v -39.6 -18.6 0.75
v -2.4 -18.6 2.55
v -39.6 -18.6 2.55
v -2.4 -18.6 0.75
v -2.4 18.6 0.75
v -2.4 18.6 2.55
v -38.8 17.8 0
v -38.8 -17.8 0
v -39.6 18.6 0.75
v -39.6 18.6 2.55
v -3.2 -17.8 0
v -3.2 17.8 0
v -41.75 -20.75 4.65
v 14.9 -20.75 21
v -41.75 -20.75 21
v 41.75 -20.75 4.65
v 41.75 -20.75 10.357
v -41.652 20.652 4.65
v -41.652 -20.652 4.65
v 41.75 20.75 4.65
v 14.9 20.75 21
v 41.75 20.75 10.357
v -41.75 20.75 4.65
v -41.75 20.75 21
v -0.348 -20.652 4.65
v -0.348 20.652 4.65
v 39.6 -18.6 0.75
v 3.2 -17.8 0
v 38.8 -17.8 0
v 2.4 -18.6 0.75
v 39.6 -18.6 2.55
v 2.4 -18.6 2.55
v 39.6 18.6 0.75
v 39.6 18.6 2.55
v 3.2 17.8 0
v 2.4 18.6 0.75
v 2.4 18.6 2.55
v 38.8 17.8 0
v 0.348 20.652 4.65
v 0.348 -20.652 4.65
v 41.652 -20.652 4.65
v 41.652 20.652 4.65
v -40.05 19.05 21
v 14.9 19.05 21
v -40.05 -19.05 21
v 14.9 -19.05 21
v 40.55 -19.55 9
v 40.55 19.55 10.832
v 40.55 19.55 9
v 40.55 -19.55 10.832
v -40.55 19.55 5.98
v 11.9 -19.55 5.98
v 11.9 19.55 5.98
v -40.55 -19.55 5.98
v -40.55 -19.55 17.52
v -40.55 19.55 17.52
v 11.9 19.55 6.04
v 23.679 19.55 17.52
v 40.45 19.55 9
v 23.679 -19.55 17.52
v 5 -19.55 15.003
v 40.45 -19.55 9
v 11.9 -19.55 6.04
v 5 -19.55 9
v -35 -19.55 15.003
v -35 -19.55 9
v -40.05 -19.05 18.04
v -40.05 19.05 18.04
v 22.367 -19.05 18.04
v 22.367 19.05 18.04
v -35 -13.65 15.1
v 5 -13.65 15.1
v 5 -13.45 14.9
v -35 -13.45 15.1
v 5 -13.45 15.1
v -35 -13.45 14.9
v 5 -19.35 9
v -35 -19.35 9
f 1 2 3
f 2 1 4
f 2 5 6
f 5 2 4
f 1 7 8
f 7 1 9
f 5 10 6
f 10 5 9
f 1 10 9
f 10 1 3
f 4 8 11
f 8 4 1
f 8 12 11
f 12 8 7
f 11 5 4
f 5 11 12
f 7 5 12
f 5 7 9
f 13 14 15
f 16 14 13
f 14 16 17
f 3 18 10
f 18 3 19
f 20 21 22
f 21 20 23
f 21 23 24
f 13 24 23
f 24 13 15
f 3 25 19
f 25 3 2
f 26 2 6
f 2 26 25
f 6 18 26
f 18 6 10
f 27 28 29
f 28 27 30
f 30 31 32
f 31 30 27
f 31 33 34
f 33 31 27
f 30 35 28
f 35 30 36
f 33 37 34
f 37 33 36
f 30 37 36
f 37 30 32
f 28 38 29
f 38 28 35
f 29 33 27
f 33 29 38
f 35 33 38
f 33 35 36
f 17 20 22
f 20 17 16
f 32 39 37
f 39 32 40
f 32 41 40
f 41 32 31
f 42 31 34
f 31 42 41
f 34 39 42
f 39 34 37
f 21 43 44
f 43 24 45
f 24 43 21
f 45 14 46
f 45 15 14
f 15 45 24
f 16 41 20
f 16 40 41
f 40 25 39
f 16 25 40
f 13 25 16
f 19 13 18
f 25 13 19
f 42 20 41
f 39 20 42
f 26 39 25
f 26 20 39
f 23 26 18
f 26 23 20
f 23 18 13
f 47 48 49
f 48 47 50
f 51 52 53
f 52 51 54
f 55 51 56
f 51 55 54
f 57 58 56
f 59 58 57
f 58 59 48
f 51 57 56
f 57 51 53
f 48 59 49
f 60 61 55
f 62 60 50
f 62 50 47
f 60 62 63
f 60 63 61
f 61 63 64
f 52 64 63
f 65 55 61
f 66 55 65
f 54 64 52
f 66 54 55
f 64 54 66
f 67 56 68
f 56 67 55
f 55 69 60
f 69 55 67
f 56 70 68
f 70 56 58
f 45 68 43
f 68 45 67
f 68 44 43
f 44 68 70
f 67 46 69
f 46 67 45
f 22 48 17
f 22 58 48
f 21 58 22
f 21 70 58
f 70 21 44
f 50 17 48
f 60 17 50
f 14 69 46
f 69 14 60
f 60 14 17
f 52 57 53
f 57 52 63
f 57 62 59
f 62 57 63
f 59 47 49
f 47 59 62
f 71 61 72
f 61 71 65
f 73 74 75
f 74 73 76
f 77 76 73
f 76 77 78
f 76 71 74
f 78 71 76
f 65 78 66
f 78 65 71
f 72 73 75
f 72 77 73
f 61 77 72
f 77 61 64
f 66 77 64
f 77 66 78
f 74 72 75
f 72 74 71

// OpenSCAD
// Gridfinity bin 2x1 x 3U tall
// Outside 83.5 x 41.5, H=21, foot 0.8/1.8/2.15, stacking lip, label shelf, scoop
grid = 42;
clr = 0.5;
Lx = 2*grid - clr; // 83.5
Ly = 1*grid - clr; // 41.5
H = 3*7; // 21
h1 = 0.8;
h2 = 1.8;
h3 = 2.15;
Hfoot = h1+h2+h3; // 4.75
foot_bot = Ly - 2*(h1+h3); // 35.6
foot_mid = foot_bot + 2*h1; // 37.2
wt = 1.2;
lipExtra = 0.5;
floorTop = 6.0;
lipTrans0 = 17.5;
lipTop0 = 18.0;
frontTop = 10;
x0 = 15;
xr0 = 12;
rampTop = 9;
shelfLen = 40;
shelfCx = -15; // shelf x in [-35,5]
shelf_y_wall = -(Ly/2 - wt); // -19.55
shelf_y_tip = shelf_y_wall + 6; // -13.55
shelf_z_bot = 9;
shelf_z_top = 15;
x1f = -grid/2;
x2f = grid/2;

echo(cadverify_spec = [
    ["bounds", [[-Lx/2, -Ly/2, 0], [Lx/2, Ly/2, H]]],
    ["bodies", 1],
    ["through_holes", 0],
    ["support_faces", [["bed", "-z", 2000]]],
    ["overhangs_allowed", [
        ["foot chamfer, 45deg self-supporting", [[-39.8, -18.8, -0.1], [-2.2, 18.8, 0.9]]],
        ["foot chamfer, 45deg self-supporting", [[2.2, -18.8, -0.1], [39.8, 18.8, 0.9]]],
        ["bridge between feet, 0.5mm span", [[-41.75, -20.75, 4.5], [41.75, 20.75, 4.8]]],
        ["label shelf underside", [[-35.2, -19.8, 8.8], [5.2, -19.1, 9.2]]]
    ]],
    ["copies", 1],
    ["details", [
        ["foot_left", "material", [[x1f-foot_bot/2, -foot_bot/2, 0.05], [x1f+foot_bot/2, foot_bot/2, 0.55]], 0.9],
        ["foot_right", "material", [[x2f-foot_bot/2, -foot_bot/2, 0.05], [x2f+foot_bot/2, foot_bot/2, 0.55]], 0.9],
        ["lip_back", "material", [[-30, Ly/2-wt-lipExtra, 19], [0, Ly/2, 21]], 0.9],
        ["label_shelf", "material", [[-30, -19, 14.5], [0, -14.5, 15]], 0.9],
        ["scoop_void", "void", [[30, -15, 10.5], [40.4, 15, 14]], 0.9],
        ["cavity", "void", [[-20, -10, 10], [10, 10, 16]], 0.9],
        ["wall", "thickness", [0, 25, 15], [0, -1, 0], 1.2],
        ["floor", "thickness", [-21, 0, -5], [0, 0, 1], 6.0]
    ]]
]);

module foot(cx) {
    hull() {
        translate([cx-foot_bot/2, -foot_bot/2, 0]) cube([foot_bot, foot_bot, 0.1]);
        translate([cx-foot_mid/2, -foot_mid/2, h1-0.05]) cube([foot_mid, foot_mid, 0.1]);
    }
    translate([cx-foot_mid/2, -foot_mid/2, h1-0.05]) cube([foot_mid, foot_mid, h2+0.1]);
    hull() {
        translate([cx-foot_mid/2, -foot_mid/2, h1+h2-0.05]) cube([foot_mid, foot_mid, 0.1]);
        translate([cx-Ly/2, -Ly/2, Hfoot]) cube([Ly, Ly, 0.1]);
    }
}

module body_outer() {
    foot(x1f);
    foot(x2f);
    translate([-Lx/2, -Ly/2, Hfoot-0.1]) cube([Lx, Ly, H-Hfoot+0.1]);
}

module cavity_solid() {
    intL_low = Lx-2*wt;
    intW_low = Ly-2*wt;
    intL_up = Lx-2*(wt+lipExtra);
    intW_up = Ly-2*(wt+lipExtra);
    translate([-intL_low/2, -intW_low/2, floorTop-0.02]) cube([intL_low, intW_low, (lipTrans0-floorTop)+0.02]);
    hull() {
        translate([-intL_low/2, -intW_low/2, lipTrans0-0.02]) cube([intL_low, intW_low, 0.04]);
        translate([-intL_up/2, -intW_up/2, lipTop0]) cube([intL_up, intW_up, 0.04]);
    }
    translate([-intL_up/2, -intW_up/2, lipTop0-0.02]) cube([intL_up, intW_up, (H+2-lipTop0)+0.02]);
}

module scoop_cut() {
    W = Ly+2;
    x1cut = Lx/2+1;
    hull() {
        translate([x0-0.1, -W/2, H]) cube([0.2, W, 2]);
        translate([x1cut-0.1, -W/2, frontTop]) cube([0.2, W, (H+2-frontTop)]);
    }
}

module scoop_ramp() {
    intW = Ly-2*wt;
    xr1 = Lx/2-wt;
    hull() {
        translate([xr0-0.1, -intW/2, floorTop-0.1]) cube([0.2, intW, 0.14]);
        translate([xr1-0.1, -intW/2, floorTop-0.1]) cube([0.2, intW, (rampTop-floorTop)+0.1]);
    }
}

module label_shelf_mod() {
    hull() {
        translate([shelfCx-shelfLen/2, shelf_y_wall-0.2, shelf_z_bot]) cube([shelfLen, 0.4, shelf_z_top-shelf_z_bot]);
        translate([shelfCx-shelfLen/2, shelf_y_tip-0.1, shelf_z_top-0.1]) cube([shelfLen, 0.2, 0.2]);
    }
}

module bin_part() {
    difference() {
        body_outer();
        cavity_solid();
        scoop_cut();
    }
}

union() {
    bin_part();
    scoop_ramp();
    label_shelf_mod();
}
